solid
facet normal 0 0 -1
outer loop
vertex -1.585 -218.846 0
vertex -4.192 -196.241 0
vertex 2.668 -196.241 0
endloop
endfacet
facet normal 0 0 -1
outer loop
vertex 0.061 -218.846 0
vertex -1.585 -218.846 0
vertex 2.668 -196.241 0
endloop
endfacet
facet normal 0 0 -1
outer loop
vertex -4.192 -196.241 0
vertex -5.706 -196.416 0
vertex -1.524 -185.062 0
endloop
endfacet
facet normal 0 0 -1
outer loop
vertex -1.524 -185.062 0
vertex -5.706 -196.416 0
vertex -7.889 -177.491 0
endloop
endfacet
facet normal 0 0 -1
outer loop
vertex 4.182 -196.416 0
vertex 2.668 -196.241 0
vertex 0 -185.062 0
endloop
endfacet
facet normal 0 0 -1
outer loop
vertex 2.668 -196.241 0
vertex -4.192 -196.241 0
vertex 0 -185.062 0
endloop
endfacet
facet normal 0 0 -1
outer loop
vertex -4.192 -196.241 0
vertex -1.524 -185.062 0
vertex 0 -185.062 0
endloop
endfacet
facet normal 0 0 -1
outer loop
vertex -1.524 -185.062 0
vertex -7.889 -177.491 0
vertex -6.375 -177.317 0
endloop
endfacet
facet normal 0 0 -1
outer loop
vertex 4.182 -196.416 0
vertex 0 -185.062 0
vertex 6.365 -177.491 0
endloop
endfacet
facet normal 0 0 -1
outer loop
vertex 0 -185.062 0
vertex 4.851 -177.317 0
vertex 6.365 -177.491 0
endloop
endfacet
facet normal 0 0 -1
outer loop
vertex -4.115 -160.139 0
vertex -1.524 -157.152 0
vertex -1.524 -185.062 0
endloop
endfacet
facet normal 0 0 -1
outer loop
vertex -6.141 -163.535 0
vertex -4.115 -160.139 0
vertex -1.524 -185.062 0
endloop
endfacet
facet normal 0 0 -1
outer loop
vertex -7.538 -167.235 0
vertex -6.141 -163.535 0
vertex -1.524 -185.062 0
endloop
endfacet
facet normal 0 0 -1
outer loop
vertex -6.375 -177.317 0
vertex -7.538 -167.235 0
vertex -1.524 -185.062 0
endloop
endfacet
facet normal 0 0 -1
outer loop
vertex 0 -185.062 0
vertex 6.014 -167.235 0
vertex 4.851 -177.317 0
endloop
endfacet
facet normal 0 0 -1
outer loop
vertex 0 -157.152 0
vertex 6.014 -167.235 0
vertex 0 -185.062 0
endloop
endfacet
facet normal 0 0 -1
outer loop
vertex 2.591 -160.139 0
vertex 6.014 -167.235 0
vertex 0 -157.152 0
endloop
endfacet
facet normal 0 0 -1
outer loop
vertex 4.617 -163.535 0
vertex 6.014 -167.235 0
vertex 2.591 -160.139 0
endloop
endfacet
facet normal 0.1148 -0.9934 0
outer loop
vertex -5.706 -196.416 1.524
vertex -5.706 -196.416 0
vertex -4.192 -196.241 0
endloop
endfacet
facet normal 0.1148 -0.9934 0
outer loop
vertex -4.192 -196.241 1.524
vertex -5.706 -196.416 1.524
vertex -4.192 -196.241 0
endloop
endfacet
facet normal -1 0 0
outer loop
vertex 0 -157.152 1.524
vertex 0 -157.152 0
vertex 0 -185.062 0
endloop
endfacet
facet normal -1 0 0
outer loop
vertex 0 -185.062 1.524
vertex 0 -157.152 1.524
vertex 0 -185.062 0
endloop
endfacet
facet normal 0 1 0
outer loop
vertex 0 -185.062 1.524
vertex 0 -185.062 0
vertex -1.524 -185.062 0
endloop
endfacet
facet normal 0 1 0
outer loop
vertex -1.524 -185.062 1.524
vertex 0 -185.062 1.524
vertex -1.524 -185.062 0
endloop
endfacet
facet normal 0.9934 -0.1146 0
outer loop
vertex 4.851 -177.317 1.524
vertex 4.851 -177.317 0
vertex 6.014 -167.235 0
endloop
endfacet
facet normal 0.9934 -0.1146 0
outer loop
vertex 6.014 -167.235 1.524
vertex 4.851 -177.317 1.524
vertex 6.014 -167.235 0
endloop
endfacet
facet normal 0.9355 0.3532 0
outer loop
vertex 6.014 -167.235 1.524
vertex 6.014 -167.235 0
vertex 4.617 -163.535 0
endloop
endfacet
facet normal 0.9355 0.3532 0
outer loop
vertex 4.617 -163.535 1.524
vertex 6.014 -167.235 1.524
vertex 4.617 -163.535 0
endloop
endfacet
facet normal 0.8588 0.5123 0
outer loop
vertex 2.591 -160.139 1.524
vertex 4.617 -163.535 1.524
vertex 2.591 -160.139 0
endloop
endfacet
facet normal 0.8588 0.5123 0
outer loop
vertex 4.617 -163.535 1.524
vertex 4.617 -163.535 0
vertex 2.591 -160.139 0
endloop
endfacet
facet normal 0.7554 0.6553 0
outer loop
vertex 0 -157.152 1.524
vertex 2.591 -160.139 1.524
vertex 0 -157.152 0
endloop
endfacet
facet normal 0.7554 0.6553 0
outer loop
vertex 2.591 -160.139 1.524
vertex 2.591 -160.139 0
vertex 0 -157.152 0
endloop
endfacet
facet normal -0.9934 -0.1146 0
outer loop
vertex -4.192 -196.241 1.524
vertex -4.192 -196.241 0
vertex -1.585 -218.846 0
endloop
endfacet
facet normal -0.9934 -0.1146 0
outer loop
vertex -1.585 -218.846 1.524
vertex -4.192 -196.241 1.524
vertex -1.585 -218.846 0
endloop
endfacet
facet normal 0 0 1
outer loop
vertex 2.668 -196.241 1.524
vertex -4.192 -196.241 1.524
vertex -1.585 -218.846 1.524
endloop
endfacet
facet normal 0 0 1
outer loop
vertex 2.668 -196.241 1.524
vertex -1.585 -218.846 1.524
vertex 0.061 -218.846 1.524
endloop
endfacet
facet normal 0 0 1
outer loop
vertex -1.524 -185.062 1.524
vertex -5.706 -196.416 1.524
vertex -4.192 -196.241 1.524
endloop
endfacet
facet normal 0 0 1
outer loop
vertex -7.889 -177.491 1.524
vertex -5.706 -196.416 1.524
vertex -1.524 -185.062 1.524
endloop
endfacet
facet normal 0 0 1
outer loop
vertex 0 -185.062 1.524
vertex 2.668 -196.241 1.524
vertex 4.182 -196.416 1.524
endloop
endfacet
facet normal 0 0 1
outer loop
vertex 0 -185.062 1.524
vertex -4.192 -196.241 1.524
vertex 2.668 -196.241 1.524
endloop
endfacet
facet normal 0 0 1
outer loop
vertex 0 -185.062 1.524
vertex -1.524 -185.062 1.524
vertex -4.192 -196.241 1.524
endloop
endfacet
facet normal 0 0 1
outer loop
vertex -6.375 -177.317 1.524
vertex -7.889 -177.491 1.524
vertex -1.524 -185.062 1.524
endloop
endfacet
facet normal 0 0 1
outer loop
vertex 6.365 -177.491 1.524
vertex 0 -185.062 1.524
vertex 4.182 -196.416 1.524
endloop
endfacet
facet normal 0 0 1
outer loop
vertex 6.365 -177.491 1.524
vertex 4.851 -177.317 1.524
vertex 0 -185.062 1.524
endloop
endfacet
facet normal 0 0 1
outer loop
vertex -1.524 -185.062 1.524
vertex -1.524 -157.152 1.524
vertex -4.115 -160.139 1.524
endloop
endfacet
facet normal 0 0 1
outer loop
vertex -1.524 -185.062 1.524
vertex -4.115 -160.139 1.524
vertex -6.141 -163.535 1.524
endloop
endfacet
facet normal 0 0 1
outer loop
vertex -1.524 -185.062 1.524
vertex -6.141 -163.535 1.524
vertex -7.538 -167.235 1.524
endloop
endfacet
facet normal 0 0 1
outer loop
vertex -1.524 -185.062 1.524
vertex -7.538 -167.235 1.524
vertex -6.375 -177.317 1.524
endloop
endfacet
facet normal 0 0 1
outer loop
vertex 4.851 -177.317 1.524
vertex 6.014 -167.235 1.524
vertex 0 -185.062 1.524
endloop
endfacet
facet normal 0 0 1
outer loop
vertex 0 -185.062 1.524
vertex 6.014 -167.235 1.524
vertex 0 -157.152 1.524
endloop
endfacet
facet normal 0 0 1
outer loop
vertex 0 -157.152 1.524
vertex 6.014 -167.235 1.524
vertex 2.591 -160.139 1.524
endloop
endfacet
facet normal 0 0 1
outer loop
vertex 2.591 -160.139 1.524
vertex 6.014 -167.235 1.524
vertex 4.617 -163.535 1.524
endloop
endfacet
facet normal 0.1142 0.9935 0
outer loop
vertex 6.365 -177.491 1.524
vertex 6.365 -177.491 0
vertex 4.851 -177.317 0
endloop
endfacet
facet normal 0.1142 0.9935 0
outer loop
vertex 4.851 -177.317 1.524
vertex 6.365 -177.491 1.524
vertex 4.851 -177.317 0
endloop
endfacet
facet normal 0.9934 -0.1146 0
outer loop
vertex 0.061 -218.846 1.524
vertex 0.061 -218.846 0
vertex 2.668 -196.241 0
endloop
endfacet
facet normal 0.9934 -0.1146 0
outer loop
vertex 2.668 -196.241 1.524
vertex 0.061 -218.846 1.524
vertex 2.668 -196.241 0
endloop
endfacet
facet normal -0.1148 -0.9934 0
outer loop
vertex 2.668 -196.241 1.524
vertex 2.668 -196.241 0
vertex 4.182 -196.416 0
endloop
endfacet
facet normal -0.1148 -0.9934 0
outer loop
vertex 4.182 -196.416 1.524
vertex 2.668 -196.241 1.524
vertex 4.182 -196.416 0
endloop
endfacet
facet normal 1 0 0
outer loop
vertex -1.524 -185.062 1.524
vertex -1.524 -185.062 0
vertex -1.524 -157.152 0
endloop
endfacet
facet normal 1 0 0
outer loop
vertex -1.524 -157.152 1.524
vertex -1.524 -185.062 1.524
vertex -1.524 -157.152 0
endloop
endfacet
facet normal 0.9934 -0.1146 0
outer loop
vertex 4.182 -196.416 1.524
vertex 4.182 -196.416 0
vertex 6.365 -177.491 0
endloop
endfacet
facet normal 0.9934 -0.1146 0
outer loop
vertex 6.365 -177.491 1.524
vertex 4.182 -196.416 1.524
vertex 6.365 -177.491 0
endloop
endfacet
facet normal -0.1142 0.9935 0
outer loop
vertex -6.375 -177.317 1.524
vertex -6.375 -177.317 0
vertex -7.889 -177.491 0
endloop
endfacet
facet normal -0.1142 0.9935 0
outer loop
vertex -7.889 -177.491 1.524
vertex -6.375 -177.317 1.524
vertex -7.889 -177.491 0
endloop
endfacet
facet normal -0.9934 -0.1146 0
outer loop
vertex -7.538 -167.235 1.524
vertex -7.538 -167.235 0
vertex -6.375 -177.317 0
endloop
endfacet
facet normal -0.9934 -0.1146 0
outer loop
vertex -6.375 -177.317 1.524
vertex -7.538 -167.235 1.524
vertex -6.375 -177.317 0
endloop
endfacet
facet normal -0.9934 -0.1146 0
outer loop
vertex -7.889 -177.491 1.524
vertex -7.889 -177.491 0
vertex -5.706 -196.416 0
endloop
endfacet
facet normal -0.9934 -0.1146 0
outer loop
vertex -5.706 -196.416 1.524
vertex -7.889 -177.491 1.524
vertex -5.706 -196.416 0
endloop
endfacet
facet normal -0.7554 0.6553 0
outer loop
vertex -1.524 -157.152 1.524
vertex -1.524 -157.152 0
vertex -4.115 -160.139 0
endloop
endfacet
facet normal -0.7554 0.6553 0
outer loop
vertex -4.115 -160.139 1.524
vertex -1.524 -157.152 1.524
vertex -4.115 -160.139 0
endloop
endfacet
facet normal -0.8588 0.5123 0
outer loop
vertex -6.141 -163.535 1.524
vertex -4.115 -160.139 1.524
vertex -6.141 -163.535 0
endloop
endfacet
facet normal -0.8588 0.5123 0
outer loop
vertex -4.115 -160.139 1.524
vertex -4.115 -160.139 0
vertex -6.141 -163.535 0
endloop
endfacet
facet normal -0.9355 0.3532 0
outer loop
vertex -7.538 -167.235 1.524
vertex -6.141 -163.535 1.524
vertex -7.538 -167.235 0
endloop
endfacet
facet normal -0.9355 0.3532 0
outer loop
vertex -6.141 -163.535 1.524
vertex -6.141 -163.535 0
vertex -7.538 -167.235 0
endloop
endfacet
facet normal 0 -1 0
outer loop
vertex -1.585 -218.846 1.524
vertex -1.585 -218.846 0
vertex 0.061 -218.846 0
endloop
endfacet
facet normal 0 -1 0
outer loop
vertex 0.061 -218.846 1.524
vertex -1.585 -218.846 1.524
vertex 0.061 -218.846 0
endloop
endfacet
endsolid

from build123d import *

# Parameters (mm, degrees)
BOSS_EXTRUDE1_DEPTH = 1.524


with BuildPart() as part:
    # Sketch1 → Boss-Extrude1 (new body)
    with BuildSketch(Plane.XY):
        with BuildLine():
            Line((0, -185.062075144), (-1.524, -185.062075144))
            Line((-1.524, -185.062075144), (-1.524, -157.15233073))
            ThreePointArc((-1.524, -157.15233073), (-5.202982181, -161.792523258), (-7.537553978, -167.234588225))
            Line((-7.537553978, -167.234588225), (-6.374749179, -177.316845721))
            Line((-6.374749179, -177.316845721), (-7.888713502, -177.491453935))
            Line((-7.888713502, -177.491453935), (-5.70611082, -196.416007973))
            Line((-5.70611082, -196.416007973), (-4.192146497, -196.241399759))
            Line((-4.192146497, -196.241399759), (-1.585117021, -218.846004156))
            Line((-1.585117021, -218.846004156), (0.061117021, -218.846004156))
            Line((0.061117021, -218.846004156), (2.668146497, -196.241399759))
            Line((2.668146497, -196.241399759), (4.18211082, -196.416007973))
            Line((4.18211082, -196.416007973), (6.364713502, -177.491453935))
            Line((6.364713502, -177.491453935), (4.850749179, -177.316845721))
            Line((4.850749179, -177.316845721), (6.013553978, -167.234588225))
            ThreePointArc((6.013553978, -167.234588225), (3.678982181, -161.792523258), (0, -157.15233073))
            Line((0, -157.15233073), (0, -185.062075144))
        make_face()
    extrude(amount=BOSS_EXTRUDE1_DEPTH)


solid = part.part
